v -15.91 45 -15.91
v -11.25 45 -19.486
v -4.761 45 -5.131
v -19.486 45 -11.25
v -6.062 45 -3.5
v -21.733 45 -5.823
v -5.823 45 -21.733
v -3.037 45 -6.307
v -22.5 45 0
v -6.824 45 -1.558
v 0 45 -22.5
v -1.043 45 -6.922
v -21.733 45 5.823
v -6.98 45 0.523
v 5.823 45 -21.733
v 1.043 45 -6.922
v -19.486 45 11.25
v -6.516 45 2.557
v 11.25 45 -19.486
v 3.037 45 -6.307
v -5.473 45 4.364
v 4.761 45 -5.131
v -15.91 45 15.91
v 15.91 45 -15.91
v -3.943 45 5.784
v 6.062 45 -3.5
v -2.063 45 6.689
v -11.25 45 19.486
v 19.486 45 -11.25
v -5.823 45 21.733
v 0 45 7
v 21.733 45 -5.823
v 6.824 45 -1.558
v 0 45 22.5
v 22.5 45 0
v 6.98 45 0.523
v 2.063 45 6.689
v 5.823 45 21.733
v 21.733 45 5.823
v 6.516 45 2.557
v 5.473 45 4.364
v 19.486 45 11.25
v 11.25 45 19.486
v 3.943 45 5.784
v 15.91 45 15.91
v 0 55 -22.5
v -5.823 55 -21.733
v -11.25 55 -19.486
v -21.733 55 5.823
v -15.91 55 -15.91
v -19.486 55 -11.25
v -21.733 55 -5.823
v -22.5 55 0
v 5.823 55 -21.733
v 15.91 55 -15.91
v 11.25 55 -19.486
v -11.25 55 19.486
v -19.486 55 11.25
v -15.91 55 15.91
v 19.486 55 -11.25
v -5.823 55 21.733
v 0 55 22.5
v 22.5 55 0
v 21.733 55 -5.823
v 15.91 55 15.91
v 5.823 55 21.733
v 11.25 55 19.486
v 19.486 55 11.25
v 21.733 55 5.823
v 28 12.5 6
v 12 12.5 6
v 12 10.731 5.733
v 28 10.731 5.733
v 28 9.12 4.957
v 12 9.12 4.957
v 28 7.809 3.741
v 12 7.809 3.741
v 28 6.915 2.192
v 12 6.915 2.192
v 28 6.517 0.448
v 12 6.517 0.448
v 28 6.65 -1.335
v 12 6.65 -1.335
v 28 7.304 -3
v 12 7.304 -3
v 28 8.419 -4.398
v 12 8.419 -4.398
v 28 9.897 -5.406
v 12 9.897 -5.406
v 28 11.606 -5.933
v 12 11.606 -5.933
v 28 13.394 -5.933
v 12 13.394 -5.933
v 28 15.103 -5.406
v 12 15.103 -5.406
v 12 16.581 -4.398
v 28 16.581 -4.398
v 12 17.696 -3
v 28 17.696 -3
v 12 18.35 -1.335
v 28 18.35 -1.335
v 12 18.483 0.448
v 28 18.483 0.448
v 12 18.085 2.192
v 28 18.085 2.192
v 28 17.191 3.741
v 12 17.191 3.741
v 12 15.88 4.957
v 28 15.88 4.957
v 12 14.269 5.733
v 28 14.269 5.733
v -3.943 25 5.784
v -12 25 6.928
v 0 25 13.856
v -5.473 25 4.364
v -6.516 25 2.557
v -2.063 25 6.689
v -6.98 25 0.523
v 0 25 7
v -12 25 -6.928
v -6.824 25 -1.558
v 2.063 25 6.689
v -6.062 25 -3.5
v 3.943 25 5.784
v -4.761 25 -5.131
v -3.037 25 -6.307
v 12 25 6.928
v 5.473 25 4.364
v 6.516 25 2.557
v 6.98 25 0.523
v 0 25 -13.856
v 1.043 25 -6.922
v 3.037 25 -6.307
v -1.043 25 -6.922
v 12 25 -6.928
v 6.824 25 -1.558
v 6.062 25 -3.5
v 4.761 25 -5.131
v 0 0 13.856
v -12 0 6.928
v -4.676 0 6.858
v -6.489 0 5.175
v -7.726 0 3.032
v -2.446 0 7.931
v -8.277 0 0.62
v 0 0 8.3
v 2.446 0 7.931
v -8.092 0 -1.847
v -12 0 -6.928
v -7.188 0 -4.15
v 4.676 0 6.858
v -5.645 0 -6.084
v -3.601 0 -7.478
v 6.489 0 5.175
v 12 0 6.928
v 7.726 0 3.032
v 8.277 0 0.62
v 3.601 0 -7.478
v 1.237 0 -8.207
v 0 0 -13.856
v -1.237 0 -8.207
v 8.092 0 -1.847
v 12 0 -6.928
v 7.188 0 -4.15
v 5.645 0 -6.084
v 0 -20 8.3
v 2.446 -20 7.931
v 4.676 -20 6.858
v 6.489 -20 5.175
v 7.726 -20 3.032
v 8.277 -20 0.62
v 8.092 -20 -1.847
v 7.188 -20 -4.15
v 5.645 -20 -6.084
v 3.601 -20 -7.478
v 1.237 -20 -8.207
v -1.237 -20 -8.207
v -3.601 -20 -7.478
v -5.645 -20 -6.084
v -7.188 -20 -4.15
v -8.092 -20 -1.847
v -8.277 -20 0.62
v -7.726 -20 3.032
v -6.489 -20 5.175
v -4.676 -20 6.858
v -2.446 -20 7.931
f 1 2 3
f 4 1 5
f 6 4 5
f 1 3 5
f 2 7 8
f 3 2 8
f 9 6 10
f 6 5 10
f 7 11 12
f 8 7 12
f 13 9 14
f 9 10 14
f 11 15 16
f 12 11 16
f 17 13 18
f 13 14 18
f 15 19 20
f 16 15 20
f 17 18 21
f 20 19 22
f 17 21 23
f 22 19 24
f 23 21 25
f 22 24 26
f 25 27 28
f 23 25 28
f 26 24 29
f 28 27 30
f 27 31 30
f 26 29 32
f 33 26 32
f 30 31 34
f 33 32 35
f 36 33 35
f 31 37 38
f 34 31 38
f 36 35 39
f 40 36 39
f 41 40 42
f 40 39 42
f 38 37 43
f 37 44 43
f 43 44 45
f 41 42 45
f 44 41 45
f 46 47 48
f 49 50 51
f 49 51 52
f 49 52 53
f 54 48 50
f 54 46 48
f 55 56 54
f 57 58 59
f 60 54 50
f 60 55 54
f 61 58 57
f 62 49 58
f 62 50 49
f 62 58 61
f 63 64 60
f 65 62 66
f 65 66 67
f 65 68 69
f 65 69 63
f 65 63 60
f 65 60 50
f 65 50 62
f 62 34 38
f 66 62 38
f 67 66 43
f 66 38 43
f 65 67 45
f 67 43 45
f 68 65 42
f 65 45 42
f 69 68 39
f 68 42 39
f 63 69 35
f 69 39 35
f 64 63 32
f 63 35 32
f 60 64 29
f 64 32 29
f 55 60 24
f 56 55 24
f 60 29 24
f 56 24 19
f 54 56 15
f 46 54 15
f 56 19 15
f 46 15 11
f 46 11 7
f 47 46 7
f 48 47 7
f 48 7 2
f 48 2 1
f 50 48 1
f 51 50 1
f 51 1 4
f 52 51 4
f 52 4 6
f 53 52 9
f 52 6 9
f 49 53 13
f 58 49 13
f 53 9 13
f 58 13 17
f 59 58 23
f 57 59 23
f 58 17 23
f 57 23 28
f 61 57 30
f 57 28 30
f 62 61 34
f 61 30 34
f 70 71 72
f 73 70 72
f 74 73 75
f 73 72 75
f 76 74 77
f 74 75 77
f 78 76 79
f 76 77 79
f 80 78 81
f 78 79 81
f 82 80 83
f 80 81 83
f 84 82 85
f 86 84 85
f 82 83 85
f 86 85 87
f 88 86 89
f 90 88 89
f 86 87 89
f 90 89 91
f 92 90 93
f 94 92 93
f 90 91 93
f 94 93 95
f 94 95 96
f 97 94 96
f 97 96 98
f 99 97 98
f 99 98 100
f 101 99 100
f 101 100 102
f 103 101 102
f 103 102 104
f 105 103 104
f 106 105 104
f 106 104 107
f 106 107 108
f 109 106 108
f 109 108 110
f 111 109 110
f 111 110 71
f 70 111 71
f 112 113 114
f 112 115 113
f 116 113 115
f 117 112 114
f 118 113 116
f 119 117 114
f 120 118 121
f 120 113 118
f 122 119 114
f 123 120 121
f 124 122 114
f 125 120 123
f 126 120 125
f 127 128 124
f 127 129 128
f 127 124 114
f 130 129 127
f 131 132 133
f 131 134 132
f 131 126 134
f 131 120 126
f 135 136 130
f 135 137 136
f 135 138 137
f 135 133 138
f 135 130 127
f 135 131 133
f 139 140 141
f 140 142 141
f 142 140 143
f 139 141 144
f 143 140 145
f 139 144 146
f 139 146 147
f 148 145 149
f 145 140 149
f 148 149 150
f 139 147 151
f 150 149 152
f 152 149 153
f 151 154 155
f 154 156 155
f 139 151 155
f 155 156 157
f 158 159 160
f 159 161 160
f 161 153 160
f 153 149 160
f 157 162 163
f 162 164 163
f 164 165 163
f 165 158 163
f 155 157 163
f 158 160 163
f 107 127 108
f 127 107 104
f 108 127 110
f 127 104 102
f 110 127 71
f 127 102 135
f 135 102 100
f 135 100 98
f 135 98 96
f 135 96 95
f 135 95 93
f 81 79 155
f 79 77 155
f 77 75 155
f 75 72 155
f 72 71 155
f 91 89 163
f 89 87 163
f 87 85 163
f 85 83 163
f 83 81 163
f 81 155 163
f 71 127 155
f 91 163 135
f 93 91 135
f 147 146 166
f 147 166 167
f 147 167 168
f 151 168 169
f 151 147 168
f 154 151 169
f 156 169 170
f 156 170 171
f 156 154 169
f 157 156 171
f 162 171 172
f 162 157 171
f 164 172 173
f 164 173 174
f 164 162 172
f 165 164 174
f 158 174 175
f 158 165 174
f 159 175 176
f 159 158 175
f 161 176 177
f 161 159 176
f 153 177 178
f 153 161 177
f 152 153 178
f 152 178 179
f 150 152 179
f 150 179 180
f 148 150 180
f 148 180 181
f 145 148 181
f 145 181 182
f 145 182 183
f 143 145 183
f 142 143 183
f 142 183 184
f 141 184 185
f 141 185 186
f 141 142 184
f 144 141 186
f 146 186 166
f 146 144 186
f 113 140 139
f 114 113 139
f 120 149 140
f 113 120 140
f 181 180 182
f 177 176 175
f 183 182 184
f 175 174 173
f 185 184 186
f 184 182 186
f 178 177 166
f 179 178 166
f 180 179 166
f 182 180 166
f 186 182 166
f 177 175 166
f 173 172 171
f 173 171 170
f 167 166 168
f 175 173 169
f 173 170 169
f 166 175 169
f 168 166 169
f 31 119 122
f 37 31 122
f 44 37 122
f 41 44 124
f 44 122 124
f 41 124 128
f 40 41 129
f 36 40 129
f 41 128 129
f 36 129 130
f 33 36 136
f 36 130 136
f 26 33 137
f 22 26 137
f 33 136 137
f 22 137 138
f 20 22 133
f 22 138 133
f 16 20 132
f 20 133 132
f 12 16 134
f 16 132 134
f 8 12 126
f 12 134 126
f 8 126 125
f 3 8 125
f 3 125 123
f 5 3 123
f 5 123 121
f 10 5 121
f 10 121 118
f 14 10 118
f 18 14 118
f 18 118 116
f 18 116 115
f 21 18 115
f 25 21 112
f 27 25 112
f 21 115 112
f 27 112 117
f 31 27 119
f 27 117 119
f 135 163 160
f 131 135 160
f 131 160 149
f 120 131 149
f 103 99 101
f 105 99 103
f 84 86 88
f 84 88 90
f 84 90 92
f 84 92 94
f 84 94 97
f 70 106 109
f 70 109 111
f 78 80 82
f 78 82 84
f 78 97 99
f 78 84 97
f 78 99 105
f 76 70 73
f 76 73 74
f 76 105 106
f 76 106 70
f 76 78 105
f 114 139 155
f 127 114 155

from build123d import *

# Parameters (mm, degrees)
SKETCH1_R           = 8.3
BOSS_EXTRUDE1_DEPTH = 20
BOSS_EXTRUDE2_DEPTH = 25
SKETCH3_R           = 7
BOSS_EXTRUDE3_DEPTH = 20
SKETCH4_R           = 22.5
BOSS_EXTRUDE4_DEPTH = 10
SKETCH5_R           = 6
BOSS_EXTRUDE5_DEPTH = 28


with BuildPart() as part:
    # Sketch1 → Boss-Extrude1 (new body)
    with BuildSketch(Plane(origin=(0, 0, 0), x_dir=(1, 0, 0), z_dir=(0, 1, 0))):
        with Locations(Location((0, 0, 0), (0, 0, 270))):
            Circle(SKETCH1_R)
    extrude(amount=-BOSS_EXTRUDE1_DEPTH)

    # Sketch2 → Boss-Extrude2 (add)
    with BuildSketch(Plane(origin=(0, 0, 0), x_dir=(1, 0, 0), z_dir=(0, 1, 0))):
        Polygon((0, 13.856406461), (-12, 6.92820323), (-12, -6.92820323), (0, -13.856406461), (12, -6.92820323), (12, 6.92820323), align=None)
    extrude(amount=BOSS_EXTRUDE2_DEPTH)

    # Sketch3 → Boss-Extrude3 (add)
    with BuildSketch(Plane(origin=(0, 25, 0), x_dir=(1, 0, 0), z_dir=(0, 1, 0))):
        with Locations(Location((0, 0, 0), (0, 0, 270))):
            Circle(SKETCH3_R)
    extrude(amount=BOSS_EXTRUDE3_DEPTH)

    # Sketch4 → Boss-Extrude4 (add)
    with BuildSketch(Plane(origin=(0, 45, 0), x_dir=(1, 0, 0), z_dir=(0, 1, 0))):
        with Locations(Location((0, 0, 0), (0, 0, 270))):
            Circle(SKETCH4_R)
    extrude(amount=BOSS_EXTRUDE4_DEPTH)

    # Sketch5 → Boss-Extrude5 (add)
    with BuildSketch(Plane(origin=(0, 0, 0), x_dir=(0, 0, -1), z_dir=(1, 0, 0))):
        with Locations(Location((0, 12.5, 0), (0, 0, 180))):
            Circle(SKETCH5_R)
    extrude(amount=BOSS_EXTRUDE5_DEPTH)


solid = part.part
